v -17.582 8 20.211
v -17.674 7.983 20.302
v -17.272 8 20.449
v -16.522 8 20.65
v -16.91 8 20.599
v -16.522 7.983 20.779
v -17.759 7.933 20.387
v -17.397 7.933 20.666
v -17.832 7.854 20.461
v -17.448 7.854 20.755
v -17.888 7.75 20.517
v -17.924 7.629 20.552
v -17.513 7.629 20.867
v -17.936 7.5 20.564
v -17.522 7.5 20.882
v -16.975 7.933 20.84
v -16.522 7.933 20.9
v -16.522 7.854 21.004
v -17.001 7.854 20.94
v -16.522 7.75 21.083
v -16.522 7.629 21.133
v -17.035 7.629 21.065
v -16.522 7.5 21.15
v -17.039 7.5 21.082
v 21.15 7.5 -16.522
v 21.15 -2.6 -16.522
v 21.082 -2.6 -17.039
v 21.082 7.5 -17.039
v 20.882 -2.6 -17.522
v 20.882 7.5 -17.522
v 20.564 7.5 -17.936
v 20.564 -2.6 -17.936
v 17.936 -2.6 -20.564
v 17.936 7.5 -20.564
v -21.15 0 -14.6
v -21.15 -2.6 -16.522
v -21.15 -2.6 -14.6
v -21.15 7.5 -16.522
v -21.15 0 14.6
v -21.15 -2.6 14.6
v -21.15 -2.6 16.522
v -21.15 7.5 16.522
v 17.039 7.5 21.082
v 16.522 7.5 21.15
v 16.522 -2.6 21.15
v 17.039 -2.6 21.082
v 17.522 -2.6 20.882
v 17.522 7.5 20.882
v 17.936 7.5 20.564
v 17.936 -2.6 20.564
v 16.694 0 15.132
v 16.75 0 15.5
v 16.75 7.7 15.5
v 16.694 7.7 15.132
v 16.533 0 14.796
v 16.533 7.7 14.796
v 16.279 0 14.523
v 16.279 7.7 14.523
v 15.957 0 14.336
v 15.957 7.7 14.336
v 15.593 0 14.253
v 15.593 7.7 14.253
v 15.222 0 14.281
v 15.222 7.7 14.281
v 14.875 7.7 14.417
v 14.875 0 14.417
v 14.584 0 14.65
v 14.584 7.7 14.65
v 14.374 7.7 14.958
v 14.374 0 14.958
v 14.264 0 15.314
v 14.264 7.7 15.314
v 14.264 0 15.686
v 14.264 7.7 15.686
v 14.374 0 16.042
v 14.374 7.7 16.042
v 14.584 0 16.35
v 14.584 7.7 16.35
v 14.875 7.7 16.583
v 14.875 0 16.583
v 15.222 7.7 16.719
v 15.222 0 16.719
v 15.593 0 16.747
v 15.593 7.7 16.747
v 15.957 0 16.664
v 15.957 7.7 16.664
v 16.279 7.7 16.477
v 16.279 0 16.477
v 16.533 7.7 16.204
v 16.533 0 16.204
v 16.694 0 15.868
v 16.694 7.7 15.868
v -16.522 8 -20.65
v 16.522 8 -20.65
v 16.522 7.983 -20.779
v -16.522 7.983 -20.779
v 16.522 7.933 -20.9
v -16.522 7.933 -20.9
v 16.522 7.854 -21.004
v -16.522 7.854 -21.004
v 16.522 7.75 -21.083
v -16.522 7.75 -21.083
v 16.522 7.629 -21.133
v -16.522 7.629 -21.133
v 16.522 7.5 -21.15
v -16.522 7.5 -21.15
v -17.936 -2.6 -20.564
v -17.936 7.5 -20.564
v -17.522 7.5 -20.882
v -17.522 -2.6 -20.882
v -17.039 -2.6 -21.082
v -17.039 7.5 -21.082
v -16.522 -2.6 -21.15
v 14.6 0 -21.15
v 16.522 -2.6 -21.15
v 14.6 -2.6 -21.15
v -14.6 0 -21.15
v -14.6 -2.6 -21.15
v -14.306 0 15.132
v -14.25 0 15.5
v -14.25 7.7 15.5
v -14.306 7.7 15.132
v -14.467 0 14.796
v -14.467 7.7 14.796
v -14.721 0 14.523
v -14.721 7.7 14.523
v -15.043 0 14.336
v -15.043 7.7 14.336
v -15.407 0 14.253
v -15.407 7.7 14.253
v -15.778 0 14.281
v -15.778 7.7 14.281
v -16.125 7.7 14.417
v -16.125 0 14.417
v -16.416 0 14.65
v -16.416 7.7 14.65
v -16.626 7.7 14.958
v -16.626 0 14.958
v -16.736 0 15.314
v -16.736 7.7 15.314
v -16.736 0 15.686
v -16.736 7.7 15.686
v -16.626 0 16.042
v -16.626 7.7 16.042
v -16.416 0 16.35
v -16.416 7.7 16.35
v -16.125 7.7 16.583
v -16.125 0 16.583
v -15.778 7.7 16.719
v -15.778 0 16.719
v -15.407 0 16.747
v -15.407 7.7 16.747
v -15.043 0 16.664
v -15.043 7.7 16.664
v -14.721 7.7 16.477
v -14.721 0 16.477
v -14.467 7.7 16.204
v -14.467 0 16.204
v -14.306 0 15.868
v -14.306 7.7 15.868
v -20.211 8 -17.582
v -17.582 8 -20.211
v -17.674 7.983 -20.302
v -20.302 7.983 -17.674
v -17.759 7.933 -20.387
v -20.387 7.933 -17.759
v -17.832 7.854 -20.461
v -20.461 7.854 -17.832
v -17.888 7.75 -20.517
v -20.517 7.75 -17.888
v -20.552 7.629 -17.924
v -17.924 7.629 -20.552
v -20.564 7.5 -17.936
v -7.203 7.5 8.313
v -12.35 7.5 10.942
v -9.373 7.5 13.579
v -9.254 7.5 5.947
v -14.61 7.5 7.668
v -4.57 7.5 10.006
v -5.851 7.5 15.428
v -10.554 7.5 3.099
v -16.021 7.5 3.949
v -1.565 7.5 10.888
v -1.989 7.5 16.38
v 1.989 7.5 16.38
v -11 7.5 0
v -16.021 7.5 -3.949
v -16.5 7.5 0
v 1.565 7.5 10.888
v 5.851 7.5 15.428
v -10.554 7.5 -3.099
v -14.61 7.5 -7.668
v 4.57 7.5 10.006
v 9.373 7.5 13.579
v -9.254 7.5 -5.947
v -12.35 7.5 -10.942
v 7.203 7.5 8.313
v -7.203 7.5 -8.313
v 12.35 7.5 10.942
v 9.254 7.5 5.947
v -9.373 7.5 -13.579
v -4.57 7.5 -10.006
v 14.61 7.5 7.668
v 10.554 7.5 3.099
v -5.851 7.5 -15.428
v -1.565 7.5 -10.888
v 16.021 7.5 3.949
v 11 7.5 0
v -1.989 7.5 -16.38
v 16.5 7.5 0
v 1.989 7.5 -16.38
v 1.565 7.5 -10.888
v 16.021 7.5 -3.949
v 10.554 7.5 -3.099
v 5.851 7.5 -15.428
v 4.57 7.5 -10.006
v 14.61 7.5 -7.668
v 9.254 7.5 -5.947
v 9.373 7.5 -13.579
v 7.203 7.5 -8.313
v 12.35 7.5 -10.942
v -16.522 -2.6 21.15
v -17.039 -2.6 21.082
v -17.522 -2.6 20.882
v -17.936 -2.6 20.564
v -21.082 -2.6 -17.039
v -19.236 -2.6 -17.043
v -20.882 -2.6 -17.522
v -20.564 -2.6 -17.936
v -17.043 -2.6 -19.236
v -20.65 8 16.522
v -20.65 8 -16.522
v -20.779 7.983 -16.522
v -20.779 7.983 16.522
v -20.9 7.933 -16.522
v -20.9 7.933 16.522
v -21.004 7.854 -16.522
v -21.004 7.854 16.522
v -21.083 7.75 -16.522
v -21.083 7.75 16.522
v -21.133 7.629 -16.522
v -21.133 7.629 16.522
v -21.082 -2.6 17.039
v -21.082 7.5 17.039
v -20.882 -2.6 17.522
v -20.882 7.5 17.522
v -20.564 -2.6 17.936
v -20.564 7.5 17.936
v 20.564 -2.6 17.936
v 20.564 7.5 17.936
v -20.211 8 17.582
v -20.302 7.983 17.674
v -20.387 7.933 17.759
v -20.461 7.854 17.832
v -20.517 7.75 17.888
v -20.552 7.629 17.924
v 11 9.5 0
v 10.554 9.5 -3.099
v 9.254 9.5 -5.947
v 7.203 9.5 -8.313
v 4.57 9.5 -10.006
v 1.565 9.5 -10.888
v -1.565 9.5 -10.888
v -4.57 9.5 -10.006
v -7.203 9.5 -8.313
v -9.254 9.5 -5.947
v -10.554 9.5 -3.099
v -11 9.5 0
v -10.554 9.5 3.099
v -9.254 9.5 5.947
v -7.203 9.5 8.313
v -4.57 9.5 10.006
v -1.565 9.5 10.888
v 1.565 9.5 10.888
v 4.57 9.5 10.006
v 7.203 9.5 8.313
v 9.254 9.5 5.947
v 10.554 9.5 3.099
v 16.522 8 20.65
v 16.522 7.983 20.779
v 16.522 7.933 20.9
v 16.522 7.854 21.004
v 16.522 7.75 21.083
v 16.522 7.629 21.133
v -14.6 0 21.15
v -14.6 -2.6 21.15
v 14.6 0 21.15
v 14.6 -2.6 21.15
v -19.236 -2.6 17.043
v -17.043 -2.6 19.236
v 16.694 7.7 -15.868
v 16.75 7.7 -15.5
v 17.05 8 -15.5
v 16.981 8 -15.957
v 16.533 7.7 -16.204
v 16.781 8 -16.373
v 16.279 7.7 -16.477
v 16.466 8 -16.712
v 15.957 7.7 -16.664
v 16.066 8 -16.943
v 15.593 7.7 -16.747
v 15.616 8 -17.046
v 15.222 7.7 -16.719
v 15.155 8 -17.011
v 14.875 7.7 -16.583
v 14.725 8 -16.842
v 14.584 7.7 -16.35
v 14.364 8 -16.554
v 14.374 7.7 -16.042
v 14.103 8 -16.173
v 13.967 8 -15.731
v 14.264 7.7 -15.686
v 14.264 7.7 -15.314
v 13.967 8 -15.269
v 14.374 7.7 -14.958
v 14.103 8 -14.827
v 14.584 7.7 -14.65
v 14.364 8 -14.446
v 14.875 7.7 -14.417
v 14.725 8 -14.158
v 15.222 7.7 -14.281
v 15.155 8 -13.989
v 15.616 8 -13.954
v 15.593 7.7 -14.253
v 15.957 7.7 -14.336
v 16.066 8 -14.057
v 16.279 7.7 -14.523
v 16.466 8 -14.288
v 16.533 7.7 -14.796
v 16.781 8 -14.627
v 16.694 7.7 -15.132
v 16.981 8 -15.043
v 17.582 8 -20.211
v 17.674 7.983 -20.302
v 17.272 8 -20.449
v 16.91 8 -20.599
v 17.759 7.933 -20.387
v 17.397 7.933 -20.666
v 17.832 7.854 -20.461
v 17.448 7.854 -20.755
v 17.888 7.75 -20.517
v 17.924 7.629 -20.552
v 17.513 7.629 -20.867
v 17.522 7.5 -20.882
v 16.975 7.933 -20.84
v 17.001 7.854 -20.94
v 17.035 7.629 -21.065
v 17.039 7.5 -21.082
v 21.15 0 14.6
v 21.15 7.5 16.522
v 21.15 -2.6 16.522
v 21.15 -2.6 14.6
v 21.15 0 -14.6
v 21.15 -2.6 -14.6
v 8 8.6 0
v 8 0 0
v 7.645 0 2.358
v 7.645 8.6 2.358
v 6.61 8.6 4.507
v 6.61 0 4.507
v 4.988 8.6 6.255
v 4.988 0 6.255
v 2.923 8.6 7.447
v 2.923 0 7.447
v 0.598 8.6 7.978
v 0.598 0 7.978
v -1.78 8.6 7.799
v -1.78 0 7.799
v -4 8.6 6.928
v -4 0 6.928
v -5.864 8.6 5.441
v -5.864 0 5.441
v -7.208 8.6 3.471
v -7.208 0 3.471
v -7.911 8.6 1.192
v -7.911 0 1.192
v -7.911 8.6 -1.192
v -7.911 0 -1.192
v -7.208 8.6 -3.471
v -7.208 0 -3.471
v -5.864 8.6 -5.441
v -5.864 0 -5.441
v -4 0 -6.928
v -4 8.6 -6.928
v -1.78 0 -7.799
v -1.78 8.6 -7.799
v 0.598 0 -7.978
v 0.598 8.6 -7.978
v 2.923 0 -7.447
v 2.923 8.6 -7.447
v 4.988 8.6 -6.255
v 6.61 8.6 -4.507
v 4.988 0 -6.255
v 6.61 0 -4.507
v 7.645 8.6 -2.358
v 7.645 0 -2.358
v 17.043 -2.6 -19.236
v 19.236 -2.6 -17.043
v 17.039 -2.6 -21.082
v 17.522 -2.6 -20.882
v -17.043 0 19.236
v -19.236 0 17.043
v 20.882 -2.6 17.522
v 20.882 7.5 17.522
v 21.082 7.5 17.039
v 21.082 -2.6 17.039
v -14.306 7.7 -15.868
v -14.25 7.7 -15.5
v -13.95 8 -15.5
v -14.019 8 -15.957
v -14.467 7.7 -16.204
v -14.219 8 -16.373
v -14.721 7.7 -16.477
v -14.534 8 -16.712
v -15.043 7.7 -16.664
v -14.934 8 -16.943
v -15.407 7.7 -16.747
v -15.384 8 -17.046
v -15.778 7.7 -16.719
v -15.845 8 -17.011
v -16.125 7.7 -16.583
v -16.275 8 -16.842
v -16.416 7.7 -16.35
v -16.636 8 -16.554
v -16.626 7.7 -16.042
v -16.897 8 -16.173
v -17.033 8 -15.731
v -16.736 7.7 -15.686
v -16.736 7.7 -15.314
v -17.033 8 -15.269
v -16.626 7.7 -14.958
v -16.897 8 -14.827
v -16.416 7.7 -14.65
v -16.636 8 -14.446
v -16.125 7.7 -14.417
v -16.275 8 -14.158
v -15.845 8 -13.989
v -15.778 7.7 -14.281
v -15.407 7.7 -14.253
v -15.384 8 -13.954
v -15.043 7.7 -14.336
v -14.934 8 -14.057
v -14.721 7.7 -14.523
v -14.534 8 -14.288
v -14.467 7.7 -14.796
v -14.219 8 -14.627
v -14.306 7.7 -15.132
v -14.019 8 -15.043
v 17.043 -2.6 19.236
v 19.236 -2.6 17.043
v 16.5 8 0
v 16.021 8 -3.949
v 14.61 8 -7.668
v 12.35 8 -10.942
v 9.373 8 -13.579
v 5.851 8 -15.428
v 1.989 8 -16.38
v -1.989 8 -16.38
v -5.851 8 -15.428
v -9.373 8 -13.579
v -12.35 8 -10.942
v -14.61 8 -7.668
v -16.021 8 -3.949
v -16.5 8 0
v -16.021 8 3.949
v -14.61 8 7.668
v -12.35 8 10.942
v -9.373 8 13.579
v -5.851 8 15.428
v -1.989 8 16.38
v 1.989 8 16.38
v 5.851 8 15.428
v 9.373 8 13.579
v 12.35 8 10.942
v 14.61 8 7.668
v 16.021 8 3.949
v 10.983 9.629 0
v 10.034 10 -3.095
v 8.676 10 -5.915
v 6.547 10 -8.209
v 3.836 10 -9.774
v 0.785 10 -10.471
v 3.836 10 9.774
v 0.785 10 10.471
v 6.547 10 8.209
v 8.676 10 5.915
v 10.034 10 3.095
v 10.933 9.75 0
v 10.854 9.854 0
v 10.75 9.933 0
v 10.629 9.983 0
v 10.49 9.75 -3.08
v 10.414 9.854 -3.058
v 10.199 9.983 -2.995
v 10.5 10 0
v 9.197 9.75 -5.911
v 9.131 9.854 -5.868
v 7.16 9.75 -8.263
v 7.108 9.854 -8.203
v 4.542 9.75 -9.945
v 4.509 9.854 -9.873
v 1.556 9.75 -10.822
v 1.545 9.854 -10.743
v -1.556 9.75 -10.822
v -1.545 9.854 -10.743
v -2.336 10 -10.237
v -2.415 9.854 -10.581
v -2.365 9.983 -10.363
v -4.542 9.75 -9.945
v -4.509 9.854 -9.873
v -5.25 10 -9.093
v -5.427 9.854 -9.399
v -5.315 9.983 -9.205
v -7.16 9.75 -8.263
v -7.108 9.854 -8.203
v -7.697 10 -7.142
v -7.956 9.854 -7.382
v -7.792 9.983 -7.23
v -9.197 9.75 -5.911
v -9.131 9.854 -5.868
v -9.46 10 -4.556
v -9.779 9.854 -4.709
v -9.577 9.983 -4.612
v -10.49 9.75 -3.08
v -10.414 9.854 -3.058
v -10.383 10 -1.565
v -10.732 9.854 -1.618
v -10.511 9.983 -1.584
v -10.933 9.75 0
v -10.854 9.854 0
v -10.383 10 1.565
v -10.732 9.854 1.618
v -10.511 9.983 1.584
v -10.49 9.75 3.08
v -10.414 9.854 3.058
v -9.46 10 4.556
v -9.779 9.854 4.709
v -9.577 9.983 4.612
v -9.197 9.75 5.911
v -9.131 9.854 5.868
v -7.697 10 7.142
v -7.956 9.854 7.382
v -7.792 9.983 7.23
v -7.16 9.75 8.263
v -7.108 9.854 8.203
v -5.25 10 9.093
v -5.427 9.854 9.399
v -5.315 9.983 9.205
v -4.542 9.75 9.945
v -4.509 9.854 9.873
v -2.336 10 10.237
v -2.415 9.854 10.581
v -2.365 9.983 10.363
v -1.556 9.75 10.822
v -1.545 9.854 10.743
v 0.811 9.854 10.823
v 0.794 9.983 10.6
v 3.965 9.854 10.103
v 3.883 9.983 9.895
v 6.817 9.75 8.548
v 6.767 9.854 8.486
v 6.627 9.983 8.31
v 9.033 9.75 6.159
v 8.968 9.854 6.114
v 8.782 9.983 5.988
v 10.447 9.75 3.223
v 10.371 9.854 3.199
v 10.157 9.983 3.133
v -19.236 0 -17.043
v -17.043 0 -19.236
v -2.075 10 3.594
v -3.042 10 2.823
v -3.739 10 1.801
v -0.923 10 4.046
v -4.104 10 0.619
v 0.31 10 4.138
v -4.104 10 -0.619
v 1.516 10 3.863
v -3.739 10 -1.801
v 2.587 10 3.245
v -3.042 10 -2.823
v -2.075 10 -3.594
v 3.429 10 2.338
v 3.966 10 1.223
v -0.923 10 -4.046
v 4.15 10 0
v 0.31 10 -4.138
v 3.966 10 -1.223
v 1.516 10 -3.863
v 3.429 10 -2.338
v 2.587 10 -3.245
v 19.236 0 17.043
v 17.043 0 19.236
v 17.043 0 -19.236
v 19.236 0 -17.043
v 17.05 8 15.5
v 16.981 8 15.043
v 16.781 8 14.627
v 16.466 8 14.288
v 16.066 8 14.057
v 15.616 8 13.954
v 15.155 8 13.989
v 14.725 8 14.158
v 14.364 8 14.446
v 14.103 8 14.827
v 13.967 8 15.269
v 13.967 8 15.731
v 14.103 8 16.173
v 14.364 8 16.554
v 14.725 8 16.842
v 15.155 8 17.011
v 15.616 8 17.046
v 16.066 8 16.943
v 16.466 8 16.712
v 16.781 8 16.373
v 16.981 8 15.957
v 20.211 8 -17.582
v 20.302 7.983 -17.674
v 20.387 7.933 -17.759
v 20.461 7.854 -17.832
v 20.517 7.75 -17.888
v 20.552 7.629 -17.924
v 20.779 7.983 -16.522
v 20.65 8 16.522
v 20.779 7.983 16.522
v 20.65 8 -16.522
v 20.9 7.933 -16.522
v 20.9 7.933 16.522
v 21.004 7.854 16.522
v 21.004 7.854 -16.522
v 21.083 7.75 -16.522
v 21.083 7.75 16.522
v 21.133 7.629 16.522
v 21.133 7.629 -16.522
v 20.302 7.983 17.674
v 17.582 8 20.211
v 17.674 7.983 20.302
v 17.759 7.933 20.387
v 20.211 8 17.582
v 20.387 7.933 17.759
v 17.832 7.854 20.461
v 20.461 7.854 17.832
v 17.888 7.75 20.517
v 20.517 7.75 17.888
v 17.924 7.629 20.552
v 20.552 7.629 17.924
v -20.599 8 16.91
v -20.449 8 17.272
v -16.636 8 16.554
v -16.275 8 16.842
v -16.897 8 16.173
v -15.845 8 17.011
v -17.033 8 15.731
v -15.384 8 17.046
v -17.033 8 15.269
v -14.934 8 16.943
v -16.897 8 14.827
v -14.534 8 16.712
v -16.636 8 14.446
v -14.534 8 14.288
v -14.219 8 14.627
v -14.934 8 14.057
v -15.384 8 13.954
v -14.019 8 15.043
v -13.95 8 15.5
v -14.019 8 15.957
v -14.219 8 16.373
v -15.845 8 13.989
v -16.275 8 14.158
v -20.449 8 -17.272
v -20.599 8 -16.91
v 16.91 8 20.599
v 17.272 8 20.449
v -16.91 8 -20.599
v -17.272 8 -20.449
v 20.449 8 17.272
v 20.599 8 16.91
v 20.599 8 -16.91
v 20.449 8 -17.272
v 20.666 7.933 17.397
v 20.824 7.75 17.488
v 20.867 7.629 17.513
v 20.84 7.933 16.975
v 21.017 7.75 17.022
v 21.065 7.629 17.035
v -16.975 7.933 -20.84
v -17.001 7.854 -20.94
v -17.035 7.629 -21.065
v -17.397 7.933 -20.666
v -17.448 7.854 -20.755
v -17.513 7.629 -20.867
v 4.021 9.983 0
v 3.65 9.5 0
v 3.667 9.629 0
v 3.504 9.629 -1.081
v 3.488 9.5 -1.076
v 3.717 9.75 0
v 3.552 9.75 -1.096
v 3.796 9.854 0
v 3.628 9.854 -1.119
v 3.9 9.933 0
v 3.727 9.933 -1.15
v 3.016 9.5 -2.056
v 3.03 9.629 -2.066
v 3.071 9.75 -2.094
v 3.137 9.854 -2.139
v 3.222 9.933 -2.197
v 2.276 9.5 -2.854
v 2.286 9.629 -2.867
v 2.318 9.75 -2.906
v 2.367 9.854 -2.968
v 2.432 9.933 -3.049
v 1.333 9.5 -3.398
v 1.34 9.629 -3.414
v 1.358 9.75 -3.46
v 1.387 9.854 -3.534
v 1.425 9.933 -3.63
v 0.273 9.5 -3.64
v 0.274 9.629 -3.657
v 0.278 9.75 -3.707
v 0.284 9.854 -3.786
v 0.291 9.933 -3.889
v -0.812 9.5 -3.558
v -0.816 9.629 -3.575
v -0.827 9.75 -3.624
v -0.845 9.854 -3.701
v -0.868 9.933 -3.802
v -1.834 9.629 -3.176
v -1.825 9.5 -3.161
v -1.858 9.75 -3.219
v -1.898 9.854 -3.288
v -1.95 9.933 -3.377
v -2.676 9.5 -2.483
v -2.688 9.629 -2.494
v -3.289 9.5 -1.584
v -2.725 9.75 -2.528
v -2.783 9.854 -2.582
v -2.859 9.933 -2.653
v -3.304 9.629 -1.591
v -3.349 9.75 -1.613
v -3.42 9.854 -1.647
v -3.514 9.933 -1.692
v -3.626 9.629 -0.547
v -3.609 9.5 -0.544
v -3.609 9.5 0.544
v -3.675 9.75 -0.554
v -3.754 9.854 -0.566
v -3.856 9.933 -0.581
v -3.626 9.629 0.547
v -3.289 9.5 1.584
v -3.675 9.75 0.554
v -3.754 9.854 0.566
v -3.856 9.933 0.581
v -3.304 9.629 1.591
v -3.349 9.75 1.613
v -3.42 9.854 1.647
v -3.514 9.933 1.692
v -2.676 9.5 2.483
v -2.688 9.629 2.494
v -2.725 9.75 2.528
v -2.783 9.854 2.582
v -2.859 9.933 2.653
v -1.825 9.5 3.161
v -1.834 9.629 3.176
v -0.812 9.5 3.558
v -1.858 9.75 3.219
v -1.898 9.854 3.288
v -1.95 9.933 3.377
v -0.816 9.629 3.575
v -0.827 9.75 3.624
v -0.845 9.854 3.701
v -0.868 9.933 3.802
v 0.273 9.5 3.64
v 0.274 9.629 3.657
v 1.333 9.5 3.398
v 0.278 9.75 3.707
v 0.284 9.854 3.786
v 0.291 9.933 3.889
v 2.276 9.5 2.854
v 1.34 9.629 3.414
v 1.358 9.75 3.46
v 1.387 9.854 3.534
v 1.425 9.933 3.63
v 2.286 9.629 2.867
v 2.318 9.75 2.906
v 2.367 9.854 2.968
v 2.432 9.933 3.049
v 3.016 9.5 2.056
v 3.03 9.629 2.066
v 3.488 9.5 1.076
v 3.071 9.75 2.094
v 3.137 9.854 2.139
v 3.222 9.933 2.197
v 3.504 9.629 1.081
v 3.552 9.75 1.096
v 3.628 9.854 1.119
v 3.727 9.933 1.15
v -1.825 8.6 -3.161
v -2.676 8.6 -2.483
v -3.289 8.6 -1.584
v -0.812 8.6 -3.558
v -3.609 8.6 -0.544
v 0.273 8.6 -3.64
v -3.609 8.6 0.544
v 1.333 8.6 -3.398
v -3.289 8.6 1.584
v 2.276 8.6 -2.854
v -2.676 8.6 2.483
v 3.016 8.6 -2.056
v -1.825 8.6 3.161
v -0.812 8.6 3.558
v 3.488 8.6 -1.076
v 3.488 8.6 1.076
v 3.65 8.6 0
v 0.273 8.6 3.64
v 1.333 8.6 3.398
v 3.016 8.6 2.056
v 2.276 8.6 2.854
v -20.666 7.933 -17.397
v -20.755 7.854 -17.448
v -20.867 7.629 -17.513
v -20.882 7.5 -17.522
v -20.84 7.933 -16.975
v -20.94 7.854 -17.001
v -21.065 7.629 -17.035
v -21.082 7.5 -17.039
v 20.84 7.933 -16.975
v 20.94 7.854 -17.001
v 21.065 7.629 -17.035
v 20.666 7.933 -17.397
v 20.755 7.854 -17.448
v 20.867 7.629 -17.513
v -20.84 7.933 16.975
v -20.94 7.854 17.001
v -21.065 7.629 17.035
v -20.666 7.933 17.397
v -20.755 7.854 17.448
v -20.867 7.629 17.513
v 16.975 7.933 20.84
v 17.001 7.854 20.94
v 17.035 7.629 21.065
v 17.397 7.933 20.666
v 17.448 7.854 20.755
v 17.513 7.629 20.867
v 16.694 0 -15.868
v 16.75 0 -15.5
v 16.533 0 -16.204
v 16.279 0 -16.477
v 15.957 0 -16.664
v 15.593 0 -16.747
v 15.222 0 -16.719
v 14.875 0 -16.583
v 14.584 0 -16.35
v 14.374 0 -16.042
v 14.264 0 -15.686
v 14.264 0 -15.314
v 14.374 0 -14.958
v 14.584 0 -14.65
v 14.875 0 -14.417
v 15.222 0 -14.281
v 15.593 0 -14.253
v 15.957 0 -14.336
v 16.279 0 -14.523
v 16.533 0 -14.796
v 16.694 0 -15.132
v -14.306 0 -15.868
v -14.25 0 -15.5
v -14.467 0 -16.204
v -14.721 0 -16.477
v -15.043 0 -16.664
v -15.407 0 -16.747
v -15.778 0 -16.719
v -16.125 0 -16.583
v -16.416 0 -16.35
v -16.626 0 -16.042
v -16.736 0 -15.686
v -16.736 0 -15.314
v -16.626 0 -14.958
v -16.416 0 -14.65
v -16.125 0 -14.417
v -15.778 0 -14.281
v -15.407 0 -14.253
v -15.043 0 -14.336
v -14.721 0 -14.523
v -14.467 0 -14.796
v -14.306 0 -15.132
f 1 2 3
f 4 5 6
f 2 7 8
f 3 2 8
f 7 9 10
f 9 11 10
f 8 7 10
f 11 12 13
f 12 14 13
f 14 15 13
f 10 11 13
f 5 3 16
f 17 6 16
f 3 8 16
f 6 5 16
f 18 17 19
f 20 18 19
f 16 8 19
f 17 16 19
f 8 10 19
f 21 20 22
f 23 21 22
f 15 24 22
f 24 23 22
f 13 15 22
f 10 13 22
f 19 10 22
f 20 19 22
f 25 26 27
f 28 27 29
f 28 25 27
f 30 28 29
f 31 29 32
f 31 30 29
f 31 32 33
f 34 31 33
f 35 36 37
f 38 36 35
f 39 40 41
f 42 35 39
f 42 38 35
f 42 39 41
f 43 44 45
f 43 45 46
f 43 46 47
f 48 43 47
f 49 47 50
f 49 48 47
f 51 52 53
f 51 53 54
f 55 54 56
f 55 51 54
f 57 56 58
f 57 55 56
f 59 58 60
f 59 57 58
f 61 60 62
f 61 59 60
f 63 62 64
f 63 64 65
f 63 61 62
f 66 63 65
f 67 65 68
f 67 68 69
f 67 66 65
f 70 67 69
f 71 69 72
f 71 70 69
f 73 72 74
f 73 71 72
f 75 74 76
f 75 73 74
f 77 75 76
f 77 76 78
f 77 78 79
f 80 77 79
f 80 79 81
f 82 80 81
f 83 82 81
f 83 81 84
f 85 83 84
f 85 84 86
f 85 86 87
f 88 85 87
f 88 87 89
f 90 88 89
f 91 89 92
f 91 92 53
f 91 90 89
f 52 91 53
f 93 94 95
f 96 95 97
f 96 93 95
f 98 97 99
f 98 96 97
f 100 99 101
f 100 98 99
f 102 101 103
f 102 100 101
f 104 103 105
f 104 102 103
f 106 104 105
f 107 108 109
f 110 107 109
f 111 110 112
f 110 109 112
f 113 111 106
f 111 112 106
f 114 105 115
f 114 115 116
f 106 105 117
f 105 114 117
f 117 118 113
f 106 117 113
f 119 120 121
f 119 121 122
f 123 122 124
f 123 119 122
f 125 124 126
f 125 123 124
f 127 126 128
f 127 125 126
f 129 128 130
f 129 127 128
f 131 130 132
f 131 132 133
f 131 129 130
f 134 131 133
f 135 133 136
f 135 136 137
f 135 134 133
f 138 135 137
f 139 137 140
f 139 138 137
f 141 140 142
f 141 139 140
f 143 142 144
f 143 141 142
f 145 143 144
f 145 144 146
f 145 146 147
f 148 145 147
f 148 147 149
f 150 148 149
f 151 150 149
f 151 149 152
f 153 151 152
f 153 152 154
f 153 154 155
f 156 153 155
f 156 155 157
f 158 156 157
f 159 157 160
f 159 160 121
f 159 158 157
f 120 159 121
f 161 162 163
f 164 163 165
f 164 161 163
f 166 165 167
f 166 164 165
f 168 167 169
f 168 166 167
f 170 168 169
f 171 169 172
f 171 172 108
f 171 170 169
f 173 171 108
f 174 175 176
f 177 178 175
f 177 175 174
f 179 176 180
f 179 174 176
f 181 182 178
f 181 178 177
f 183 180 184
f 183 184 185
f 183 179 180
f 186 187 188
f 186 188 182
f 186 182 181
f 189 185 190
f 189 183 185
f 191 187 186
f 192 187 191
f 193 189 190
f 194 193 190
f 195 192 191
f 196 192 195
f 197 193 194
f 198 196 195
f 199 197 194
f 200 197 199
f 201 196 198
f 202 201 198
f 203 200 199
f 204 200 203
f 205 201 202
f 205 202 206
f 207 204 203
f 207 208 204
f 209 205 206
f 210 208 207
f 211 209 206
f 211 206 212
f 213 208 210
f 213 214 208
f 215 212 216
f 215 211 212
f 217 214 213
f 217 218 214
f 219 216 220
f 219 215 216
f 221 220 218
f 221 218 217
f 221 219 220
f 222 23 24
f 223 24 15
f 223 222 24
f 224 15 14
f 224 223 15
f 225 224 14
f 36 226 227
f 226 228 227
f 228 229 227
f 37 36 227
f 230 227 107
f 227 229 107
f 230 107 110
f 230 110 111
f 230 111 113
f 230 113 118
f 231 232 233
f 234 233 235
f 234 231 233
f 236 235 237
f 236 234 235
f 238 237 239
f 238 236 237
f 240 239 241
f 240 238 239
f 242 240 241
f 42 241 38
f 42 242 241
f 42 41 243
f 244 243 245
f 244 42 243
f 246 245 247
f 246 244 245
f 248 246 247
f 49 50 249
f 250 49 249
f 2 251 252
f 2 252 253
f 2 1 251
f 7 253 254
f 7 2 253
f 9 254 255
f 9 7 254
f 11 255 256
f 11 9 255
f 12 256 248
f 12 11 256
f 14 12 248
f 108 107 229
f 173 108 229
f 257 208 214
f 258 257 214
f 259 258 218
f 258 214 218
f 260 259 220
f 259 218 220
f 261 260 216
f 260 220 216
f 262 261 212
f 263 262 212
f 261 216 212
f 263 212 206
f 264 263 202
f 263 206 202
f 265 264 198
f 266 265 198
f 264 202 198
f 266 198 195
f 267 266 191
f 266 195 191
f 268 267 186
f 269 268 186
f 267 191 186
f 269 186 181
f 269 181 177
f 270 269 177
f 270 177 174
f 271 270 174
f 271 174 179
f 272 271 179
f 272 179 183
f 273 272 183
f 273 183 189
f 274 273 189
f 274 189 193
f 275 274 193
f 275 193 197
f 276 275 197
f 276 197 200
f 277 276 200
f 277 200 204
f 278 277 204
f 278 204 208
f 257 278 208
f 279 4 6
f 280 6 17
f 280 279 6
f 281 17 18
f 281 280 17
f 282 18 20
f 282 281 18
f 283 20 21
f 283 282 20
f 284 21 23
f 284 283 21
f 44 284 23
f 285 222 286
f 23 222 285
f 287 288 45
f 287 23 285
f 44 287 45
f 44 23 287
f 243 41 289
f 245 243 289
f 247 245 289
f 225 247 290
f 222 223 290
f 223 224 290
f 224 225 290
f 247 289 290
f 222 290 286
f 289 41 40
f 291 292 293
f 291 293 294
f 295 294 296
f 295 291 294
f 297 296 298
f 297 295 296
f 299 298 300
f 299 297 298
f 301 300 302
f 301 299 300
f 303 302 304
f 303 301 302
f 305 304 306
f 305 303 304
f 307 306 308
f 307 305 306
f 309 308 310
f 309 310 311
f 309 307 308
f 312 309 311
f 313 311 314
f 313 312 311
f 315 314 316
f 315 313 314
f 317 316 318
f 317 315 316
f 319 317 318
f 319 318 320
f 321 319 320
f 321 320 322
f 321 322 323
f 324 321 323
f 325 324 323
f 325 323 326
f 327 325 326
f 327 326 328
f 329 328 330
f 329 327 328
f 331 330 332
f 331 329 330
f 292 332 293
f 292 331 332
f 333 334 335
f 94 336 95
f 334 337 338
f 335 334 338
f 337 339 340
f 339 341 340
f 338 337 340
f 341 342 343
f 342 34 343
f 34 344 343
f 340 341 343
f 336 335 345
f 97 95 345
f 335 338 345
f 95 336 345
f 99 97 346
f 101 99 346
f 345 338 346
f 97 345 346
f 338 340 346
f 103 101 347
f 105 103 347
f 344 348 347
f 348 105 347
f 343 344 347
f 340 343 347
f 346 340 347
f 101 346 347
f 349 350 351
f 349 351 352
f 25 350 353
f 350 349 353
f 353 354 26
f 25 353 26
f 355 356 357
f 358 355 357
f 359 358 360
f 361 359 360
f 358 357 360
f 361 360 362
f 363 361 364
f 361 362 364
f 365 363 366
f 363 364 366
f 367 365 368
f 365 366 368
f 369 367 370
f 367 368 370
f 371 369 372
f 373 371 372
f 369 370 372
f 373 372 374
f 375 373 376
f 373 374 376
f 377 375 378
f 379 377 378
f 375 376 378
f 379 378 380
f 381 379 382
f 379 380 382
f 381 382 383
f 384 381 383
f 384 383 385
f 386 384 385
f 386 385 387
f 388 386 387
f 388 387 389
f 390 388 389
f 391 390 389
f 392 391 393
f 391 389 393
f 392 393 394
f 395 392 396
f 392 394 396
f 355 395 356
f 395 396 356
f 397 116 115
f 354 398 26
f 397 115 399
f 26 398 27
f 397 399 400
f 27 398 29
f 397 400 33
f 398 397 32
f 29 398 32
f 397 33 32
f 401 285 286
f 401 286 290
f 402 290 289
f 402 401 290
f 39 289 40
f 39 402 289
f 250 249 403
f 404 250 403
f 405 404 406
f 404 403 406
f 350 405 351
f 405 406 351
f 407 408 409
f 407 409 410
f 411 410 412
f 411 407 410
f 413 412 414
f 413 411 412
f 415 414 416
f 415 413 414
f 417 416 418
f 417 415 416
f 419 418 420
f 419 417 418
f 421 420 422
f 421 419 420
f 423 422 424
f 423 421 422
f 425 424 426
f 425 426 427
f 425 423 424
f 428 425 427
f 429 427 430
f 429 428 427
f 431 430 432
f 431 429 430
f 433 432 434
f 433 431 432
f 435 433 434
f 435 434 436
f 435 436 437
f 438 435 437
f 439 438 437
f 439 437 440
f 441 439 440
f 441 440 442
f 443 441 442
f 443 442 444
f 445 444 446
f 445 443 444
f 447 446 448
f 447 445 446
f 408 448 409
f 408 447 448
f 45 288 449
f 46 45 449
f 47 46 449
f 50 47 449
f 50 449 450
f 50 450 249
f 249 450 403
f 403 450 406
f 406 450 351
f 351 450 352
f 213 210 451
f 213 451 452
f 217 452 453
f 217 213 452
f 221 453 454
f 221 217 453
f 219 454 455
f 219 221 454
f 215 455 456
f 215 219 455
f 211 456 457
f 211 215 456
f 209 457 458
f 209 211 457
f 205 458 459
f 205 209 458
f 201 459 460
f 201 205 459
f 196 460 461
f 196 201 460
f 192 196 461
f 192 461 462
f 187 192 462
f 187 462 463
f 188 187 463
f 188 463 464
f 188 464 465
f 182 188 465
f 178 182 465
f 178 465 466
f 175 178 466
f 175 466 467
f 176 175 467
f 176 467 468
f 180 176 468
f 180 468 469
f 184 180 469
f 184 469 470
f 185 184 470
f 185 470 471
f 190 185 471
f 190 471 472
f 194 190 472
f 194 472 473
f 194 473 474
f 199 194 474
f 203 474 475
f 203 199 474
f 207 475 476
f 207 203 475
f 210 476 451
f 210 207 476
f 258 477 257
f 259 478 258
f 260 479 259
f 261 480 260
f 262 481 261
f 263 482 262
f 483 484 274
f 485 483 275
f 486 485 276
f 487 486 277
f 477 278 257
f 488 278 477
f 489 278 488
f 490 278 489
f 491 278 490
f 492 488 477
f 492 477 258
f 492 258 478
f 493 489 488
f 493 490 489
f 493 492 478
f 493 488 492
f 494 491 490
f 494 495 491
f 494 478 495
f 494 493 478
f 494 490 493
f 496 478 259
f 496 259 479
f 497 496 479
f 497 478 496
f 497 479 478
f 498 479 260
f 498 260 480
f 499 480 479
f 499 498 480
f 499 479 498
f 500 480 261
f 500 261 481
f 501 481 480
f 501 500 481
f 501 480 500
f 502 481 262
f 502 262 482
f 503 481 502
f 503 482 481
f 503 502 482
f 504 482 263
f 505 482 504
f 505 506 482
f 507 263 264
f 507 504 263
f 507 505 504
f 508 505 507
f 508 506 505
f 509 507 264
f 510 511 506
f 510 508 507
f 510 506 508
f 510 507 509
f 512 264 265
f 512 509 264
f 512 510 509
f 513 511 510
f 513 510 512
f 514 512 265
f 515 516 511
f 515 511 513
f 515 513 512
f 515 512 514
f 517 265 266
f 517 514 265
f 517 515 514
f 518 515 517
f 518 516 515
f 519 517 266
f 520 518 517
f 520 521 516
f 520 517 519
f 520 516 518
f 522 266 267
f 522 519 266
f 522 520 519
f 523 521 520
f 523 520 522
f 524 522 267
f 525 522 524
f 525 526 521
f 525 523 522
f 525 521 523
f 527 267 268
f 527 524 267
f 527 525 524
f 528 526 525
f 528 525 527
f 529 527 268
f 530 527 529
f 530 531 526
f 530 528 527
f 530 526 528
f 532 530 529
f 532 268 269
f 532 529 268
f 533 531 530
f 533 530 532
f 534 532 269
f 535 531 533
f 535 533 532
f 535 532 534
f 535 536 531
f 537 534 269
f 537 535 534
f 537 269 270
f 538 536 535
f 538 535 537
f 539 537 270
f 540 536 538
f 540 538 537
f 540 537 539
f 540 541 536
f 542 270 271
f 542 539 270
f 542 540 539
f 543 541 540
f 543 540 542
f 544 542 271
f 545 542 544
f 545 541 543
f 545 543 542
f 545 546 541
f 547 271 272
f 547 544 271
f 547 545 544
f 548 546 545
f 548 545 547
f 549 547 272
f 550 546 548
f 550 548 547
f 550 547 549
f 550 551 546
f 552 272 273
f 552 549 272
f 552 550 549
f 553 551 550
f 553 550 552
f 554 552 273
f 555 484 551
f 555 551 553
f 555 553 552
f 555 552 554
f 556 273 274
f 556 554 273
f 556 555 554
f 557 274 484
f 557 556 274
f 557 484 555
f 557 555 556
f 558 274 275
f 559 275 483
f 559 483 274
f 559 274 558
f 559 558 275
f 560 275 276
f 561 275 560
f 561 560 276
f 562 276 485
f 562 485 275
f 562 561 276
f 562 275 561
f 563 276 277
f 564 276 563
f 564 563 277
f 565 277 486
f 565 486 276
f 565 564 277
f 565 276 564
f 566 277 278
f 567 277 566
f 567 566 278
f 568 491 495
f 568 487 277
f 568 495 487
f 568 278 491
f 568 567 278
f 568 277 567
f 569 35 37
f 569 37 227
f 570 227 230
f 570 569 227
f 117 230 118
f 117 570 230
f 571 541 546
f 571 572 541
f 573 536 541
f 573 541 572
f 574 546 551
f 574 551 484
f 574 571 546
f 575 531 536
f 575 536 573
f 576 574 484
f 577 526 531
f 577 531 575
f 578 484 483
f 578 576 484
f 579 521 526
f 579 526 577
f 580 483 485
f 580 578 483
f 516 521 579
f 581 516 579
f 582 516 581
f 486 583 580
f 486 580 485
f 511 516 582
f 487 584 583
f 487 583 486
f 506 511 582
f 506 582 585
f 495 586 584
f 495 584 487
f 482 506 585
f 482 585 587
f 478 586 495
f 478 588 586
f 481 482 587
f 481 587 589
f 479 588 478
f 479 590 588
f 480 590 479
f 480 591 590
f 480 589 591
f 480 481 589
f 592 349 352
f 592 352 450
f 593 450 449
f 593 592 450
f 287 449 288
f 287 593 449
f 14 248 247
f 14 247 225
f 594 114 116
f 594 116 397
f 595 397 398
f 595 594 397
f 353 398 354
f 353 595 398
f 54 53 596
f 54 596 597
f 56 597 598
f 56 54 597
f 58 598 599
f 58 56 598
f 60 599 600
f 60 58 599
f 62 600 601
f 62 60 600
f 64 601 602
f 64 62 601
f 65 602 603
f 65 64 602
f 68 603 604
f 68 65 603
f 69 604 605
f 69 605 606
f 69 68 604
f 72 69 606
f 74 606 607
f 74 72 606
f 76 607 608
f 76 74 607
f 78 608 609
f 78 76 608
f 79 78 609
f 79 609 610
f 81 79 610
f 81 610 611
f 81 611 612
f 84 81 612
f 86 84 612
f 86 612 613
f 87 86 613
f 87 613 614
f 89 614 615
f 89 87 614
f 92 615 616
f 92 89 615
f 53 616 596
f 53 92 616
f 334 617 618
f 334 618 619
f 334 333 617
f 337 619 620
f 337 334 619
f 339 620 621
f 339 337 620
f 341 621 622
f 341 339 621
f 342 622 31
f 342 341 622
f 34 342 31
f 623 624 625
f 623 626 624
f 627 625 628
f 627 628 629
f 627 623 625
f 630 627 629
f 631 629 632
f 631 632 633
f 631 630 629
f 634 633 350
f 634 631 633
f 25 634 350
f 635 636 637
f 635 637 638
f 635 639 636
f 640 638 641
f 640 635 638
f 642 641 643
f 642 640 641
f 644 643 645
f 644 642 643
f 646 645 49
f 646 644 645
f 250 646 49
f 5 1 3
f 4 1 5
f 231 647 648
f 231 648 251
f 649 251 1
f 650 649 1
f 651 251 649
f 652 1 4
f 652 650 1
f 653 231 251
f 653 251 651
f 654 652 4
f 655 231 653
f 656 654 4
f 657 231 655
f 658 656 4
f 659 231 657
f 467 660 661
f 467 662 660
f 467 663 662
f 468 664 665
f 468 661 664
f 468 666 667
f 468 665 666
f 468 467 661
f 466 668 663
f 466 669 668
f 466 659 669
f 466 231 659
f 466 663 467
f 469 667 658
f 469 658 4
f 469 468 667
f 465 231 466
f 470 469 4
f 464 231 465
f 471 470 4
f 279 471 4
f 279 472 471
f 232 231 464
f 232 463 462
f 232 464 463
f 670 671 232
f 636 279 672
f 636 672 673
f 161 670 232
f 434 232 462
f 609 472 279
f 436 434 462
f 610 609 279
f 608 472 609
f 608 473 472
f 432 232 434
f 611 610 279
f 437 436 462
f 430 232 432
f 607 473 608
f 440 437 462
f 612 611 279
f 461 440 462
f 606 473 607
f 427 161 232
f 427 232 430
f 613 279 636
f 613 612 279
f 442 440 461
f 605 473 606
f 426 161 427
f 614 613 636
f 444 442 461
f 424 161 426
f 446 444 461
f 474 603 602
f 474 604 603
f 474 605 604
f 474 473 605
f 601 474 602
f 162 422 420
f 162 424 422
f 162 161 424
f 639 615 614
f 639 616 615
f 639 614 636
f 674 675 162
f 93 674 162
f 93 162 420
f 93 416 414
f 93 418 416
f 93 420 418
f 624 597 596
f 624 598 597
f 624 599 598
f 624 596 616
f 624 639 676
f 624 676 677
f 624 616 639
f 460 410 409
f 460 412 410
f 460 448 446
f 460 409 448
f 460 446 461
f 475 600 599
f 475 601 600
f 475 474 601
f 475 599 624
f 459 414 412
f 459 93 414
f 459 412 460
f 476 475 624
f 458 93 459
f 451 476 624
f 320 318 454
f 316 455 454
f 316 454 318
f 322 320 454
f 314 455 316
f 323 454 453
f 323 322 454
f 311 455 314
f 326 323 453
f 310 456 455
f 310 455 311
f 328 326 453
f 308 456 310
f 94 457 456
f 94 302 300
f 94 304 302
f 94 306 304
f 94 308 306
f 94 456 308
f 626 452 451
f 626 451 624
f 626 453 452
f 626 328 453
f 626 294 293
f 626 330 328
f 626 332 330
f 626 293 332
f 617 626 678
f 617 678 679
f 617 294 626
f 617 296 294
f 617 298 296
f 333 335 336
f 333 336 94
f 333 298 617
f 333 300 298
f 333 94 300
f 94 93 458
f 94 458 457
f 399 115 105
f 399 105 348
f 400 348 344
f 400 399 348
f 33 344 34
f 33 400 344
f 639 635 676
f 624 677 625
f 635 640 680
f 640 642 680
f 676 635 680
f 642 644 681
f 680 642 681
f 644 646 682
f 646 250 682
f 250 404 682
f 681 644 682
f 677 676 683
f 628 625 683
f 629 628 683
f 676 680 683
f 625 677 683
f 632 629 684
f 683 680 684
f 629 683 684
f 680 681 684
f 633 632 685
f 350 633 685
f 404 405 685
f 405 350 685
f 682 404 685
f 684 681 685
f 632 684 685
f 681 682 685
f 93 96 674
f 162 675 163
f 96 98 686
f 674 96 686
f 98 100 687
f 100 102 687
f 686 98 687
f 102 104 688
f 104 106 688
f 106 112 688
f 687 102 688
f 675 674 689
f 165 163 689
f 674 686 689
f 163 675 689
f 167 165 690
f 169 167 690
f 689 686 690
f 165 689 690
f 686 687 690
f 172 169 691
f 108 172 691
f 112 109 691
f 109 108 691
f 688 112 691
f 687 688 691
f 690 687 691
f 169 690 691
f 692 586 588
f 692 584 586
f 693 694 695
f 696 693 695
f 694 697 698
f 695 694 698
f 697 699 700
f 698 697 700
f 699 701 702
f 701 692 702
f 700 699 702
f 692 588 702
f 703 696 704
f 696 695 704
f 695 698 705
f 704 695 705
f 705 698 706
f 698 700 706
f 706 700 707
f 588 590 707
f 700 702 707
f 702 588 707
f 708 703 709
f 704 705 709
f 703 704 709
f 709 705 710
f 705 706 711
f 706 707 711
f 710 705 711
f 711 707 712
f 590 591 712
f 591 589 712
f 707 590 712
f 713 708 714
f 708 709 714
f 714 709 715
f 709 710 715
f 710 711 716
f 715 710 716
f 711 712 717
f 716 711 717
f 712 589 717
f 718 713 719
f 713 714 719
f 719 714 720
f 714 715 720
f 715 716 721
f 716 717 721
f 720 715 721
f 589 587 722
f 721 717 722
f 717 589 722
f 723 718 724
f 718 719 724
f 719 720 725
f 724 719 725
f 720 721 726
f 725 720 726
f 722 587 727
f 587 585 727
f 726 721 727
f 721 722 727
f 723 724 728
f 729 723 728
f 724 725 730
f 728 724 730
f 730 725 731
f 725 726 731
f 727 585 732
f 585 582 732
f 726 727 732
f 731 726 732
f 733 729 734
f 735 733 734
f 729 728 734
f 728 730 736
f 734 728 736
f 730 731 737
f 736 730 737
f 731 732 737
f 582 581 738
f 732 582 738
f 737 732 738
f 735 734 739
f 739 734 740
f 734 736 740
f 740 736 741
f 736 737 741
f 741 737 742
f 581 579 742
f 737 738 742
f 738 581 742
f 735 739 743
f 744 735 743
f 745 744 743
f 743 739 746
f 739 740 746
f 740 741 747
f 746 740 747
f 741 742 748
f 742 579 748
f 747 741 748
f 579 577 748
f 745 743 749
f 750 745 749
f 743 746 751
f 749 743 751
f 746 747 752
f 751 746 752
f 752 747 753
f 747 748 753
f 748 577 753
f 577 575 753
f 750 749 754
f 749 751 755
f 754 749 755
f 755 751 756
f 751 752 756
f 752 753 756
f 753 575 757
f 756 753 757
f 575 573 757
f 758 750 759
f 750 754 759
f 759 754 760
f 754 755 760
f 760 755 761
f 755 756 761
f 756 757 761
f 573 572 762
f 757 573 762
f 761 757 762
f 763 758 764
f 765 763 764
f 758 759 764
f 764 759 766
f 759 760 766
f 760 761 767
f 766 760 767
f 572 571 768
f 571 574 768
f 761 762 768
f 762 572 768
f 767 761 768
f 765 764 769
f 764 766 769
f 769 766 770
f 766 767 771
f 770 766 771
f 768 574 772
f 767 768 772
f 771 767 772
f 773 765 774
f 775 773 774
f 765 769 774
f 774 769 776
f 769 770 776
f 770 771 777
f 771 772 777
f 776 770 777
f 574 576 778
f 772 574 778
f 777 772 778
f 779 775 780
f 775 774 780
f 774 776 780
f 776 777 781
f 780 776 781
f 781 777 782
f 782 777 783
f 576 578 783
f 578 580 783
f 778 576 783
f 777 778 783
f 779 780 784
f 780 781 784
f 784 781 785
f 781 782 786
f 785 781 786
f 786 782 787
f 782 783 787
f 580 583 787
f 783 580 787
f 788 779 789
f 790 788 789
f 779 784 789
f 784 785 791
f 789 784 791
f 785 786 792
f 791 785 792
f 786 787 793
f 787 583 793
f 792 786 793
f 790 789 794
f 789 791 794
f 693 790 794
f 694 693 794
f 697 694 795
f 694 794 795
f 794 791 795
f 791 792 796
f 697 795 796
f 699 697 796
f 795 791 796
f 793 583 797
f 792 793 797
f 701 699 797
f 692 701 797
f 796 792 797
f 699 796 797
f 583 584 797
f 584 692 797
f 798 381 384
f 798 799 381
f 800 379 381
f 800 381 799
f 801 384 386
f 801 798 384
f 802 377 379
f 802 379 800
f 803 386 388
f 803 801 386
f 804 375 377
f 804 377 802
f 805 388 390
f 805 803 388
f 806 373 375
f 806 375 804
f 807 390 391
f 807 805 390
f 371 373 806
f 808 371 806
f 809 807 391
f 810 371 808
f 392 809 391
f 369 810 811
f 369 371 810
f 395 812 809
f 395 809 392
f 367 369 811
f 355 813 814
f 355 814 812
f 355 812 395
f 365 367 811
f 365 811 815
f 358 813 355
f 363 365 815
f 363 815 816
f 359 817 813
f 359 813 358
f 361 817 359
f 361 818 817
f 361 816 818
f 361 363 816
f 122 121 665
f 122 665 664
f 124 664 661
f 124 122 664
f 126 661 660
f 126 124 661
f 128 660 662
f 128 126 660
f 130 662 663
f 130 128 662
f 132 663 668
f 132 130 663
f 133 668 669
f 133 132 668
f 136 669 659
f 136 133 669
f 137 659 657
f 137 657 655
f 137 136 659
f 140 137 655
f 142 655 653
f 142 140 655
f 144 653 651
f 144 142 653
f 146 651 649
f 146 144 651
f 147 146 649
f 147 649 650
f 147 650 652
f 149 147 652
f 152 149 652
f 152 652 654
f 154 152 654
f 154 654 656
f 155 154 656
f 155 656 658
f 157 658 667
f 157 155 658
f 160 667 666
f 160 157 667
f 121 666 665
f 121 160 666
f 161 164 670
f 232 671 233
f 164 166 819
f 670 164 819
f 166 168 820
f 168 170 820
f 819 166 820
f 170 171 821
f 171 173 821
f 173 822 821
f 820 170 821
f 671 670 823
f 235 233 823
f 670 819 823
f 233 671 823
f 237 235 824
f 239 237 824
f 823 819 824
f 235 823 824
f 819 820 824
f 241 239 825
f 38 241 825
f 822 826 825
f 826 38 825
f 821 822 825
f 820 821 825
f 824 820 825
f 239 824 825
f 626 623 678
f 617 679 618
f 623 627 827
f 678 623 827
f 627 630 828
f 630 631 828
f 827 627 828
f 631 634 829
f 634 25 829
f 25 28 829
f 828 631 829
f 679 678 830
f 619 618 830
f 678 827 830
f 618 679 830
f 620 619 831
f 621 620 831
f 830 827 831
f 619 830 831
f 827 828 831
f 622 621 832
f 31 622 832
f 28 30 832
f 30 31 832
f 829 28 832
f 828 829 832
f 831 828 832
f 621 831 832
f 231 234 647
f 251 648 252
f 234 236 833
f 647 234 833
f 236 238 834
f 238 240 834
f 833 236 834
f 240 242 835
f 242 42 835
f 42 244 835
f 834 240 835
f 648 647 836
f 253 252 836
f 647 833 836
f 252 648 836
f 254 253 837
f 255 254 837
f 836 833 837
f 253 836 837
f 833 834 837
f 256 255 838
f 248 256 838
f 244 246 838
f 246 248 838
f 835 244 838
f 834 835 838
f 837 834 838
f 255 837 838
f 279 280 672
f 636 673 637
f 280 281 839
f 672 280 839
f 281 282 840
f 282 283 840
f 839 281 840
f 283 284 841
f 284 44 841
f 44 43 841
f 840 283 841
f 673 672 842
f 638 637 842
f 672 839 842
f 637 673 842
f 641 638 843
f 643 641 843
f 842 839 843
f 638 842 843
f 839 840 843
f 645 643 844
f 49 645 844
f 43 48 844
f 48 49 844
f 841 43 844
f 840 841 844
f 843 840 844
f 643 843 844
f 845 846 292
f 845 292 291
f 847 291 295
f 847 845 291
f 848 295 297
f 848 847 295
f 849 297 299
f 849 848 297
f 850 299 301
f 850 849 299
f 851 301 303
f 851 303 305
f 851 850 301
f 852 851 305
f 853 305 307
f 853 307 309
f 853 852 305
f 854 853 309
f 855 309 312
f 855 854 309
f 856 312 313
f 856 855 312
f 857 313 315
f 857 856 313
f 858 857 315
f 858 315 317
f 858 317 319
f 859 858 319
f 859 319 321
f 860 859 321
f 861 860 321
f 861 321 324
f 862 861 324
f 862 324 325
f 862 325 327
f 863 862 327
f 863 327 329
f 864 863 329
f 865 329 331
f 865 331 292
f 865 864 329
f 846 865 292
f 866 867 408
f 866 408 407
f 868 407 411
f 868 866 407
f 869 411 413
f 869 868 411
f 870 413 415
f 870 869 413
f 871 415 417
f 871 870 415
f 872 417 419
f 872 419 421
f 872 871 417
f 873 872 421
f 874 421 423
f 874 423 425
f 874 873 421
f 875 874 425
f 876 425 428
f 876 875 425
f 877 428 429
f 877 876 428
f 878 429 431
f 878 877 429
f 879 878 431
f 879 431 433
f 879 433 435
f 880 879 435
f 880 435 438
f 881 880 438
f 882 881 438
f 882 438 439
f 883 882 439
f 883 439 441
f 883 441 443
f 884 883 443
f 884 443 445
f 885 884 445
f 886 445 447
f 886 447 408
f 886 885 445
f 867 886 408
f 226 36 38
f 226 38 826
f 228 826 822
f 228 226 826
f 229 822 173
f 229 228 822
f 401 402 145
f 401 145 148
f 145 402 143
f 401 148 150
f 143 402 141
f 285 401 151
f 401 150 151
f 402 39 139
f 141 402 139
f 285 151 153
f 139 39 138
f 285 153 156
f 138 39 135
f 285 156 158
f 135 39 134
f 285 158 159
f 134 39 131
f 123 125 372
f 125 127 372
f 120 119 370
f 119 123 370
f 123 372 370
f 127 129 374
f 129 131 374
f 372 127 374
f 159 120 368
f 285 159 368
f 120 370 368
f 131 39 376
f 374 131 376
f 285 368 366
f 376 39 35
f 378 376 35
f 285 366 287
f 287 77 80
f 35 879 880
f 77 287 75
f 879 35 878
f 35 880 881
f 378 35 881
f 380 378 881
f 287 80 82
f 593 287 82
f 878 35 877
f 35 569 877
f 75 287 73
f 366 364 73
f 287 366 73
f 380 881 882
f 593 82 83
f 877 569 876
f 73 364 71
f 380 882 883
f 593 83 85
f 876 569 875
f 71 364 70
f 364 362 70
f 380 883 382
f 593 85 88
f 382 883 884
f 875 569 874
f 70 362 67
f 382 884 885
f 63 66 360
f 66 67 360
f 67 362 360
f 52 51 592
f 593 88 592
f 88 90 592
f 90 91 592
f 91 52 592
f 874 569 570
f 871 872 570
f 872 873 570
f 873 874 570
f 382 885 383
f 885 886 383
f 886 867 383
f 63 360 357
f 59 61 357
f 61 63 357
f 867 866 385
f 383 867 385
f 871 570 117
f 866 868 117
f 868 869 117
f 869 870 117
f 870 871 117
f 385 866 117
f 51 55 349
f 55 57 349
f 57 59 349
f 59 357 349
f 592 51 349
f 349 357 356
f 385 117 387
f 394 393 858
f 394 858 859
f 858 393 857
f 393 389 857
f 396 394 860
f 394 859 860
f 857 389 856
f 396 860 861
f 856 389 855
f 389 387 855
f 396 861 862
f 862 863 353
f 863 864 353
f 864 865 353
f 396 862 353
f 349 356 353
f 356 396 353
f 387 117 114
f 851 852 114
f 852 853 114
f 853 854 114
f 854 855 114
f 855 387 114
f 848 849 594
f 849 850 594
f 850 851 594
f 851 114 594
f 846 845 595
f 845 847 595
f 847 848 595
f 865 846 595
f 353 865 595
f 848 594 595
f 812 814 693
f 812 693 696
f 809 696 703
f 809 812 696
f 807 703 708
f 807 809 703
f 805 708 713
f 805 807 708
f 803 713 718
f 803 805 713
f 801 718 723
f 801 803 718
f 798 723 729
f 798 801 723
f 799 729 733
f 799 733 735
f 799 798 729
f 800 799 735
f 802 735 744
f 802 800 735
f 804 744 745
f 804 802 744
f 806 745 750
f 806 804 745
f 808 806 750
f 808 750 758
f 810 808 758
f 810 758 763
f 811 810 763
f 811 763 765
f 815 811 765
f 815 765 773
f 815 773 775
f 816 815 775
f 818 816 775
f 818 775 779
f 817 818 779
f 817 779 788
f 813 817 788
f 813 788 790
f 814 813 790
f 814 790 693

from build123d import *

# Parameters (mm, degrees)
SKETCH_1_R          = 2.65
SKETCH_1_R_2        = 16.5
SKETCH_1_R_3        = 1.25
EXTRUDE_1_DEPTH     = 8
SKETCH_1_3_R        = 16.5
SKETCH_1_3_R_2      = 11
EXTRUDE_2_DEPTH     = 7.5
SKETCH_1_4_R        = 11
SKETCH_1_4_R_2      = 3.65
EXTRUDE_3_DEPTH     = 10
EXTRUDE_4_DEPTH     = 2.6
SKETCH_2_R          = 8
CUT_EXTRUDE_1_DEPTH = 8.6
FILLET_1_R          = 2
FILLET_2_R          = 0.5
CHAMFER_1_SIZE      = 0.3


with BuildPart() as part:
    # Sketch 1 → Extrude 1 (new body)
    with BuildSketch(Plane(origin=(0, 0, 0), x_dir=(1, 0, 0), z_dir=(0, 1, 0))):
        with BuildLine():
            ThreePointArc((-14.600256847, 21.15), (-18.172644276, 18.172644276), (-21.15, 14.600256847))
            Line((-21.15, 14.600256847), (-21.15, -14.600256847))
            ThreePointArc((-21.15, -14.600256847), (-18.172644276, -18.172644276), (-14.600256847, -21.15))
            Line((-14.600256847, -21.15), (14.600256847, -21.15))
            ThreePointArc((14.600256847, -21.15), (18.172644276, -18.172644276), (21.15, -14.600256847))
            Line((21.15, -14.600256847), (21.15, 14.600256847))
            ThreePointArc((21.15, 14.600256847), (18.172644276, 18.172644276), (14.600256847, 21.15))
            Line((14.600256847, 21.15), (-14.600256847, 21.15))
        make_face()
        with Locations((-15.5, -15.5)):
            Circle(SKETCH_1_R, mode=Mode.SUBTRACT)
        with Locations((15.5, -15.5)):
            Circle(SKETCH_1_R, mode=Mode.SUBTRACT)
        Circle(SKETCH_1_R_2, mode=Mode.SUBTRACT)
        with Locations((-15.5, 15.5)):
            Circle(SKETCH_1_R, mode=Mode.SUBTRACT)
        with Locations((15.5, 15.5)):
            Circle(SKETCH_1_R, mode=Mode.SUBTRACT)
        with Locations((15.5, -15.5)):
            Circle(SKETCH_1_R)
        with Locations((15.5, -15.5)):
            Circle(SKETCH_1_R_3, mode=Mode.SUBTRACT)
        with Locations((-15.5, -15.5)):
            Circle(SKETCH_1_R)
        with Locations((-15.5, -15.5)):
            Circle(SKETCH_1_R_3, mode=Mode.SUBTRACT)
        with Locations((-15.5, 15.5)):
            Circle(SKETCH_1_R)
        with Locations((-15.5, 15.5)):
            Circle(SKETCH_1_R_3, mode=Mode.SUBTRACT)
        with Locations((15.5, 15.5)):
            Circle(SKETCH_1_R)
        with Locations((15.5, 15.5)):
            Circle(SKETCH_1_R_3, mode=Mode.SUBTRACT)
        with BuildLine():
            ThreePointArc((-14.600256847, -21.15), (-18.172644276, -18.172644276), (-21.15, -14.600256847))
            Line((-21.15, -14.600256847), (-21.15, -17.35))
            Line((-21.15, -17.35), (-17.35, -21.15))
            Line((-17.35, -21.15), (-14.600256847, -21.15))
        make_face()
        with BuildLine():
            Line((-17.35, 21.15), (-21.15, 17.35))
            Line((-21.15, 17.35), (-21.15, 14.600256847))
            ThreePointArc((-21.15, 14.600256847), (-18.172644276, 18.172644276), (-14.600256847, 21.15))
            Line((-14.600256847, 21.15), (-17.35, 21.15))
        make_face()
        with BuildLine():
            Line((17.35, 21.15), (14.600256847, 21.15))
            ThreePointArc((14.600256847, 21.15), (18.172644276, 18.172644276), (21.15, 14.600256847))
            Line((21.15, 14.600256847), (21.15, 17.35))
            Line((21.15, 17.35), (17.35, 21.15))
        make_face()
        with BuildLine():
            ThreePointArc((21.15, -14.600256847), (18.172644276, -18.172644276), (14.600256847, -21.15))
            Line((14.600256847, -21.15), (17.35, -21.15))
            Line((17.35, -21.15), (21.15, -17.35))
            Line((21.15, -17.35), (21.15, -14.600256847))
        make_face()
    extrude(amount=EXTRUDE_1_DEPTH)

    # Sketch 1_3 → Extrude 2 (add)
    with BuildSketch(Plane(origin=(0, 0, 0), x_dir=(1, 0, 0), z_dir=(0, 1, 0))):
        Circle(SKETCH_1_3_R)
        Circle(SKETCH_1_3_R_2, mode=Mode.SUBTRACT)
    extrude(amount=EXTRUDE_2_DEPTH)

    # Sketch 1_4 → Extrude 3 (add)
    with BuildSketch(Plane(origin=(0, 0, 0), x_dir=(1, 0, 0), z_dir=(0, 1, 0))):
        Circle(SKETCH_1_4_R)
        Circle(SKETCH_1_4_R_2, mode=Mode.SUBTRACT)
    extrude(amount=EXTRUDE_3_DEPTH)

    # Sketch 1_5 → Extrude 4 (add)
    with BuildSketch(Plane(origin=(0, 0, 0), x_dir=(1, 0, 0), z_dir=(0, 1, 0))):
        with BuildLine():
            ThreePointArc((-14.600256847, -21.15), (-18.172644276, -18.172644276), (-21.15, -14.600256847))
            Line((-21.15, -14.600256847), (-21.15, -17.35))
            Line((-21.15, -17.35), (-17.35, -21.15))
            Line((-17.35, -21.15), (-14.600256847, -21.15))
        make_face()
        with BuildLine():
            ThreePointArc((21.15, -14.600256847), (18.172644276, -18.172644276), (14.600256847, -21.15))
            Line((14.600256847, -21.15), (17.35, -21.15))
            Line((17.35, -21.15), (21.15, -17.35))
            Line((21.15, -17.35), (21.15, -14.600256847))
        make_face()
        with BuildLine():
            Line((-17.35, 21.15), (-21.15, 17.35))
            Line((-21.15, 17.35), (-21.15, 14.600256847))
            ThreePointArc((-21.15, 14.600256847), (-18.172644276, 18.172644276), (-14.600256847, 21.15))
            Line((-14.600256847, 21.15), (-17.35, 21.15))
        make_face()
        with BuildLine():
            Line((17.35, 21.15), (14.600256847, 21.15))
            ThreePointArc((14.600256847, 21.15), (18.172644276, 18.172644276), (21.15, 14.600256847))
            Line((21.15, 14.600256847), (21.15, 17.35))
            Line((21.15, 17.35), (17.35, 21.15))
        make_face()
    extrude(amount=-EXTRUDE_4_DEPTH)

    # Sketch 2 → Cut-Extrude 1 (cut)
    with BuildSketch(Plane.XZ):
        Circle(SKETCH_2_R)
    extrude(amount=-CUT_EXTRUDE_1_DEPTH, mode=Mode.SUBTRACT)

    # Fillet 1
    fillet_1_edges = [part.edges().sort_by_distance(p)[0] for p in [
        (-17.35, 2.7, 21.15),
        (-21.15, 2.7, 17.35),
        (-21.15, 2.7, -17.35),
        (-17.35, 2.7, -21.15),
        (17.35, 2.7, -21.15),
        (21.15, 2.7, -17.35),
        (21.15, 2.7, 17.35),
        (17.35, 2.7, 21.15),
    ]]
    fillet(fillet_1_edges, radius=FILLET_1_R)

    # Fillet 2
    fillet_2_edges = [part.edges().sort_by_distance(p)[0] for p in [
        (21.15, 8, 0),
        (19.25, 8, 19.25),
        (0, 8, 21.15),
        (19.25, 8, -19.25),
        (0, 8, -21.15),
        (-19.25, 8, -19.25),
        (-21.15, 8, 0),
        (-19.25, 8, 19.25),
        (20.997759065, 8, -17.28693974),
        (17.28693974, 8, -20.997759065),
        (-17.28693974, 8, -20.997759065),
        (-20.997759065, 8, -17.28693974),
        (-20.997759065, 8, 17.28693974),
        (-17.28693974, 8, 20.997759065),
        (17.28693974, 8, 20.997759065),
        (20.997759065, 8, 17.28693974),
        (-3.65, 10, 0),
        (-11, 10, 0),
    ]]
    fillet(fillet_2_edges, radius=FILLET_2_R)

    # Chamfer 1
    chamfer_1_edges = [part.edges().sort_by_distance(p)[0] for p in [
        (-16.75, 8, -15.5),
        (14.25, 8, -15.5),
        (14.25, 8, 15.5),
        (-16.75, 8, 15.5),
    ]]
    chamfer(chamfer_1_edges, length=CHAMFER_1_SIZE)


solid = part.part
